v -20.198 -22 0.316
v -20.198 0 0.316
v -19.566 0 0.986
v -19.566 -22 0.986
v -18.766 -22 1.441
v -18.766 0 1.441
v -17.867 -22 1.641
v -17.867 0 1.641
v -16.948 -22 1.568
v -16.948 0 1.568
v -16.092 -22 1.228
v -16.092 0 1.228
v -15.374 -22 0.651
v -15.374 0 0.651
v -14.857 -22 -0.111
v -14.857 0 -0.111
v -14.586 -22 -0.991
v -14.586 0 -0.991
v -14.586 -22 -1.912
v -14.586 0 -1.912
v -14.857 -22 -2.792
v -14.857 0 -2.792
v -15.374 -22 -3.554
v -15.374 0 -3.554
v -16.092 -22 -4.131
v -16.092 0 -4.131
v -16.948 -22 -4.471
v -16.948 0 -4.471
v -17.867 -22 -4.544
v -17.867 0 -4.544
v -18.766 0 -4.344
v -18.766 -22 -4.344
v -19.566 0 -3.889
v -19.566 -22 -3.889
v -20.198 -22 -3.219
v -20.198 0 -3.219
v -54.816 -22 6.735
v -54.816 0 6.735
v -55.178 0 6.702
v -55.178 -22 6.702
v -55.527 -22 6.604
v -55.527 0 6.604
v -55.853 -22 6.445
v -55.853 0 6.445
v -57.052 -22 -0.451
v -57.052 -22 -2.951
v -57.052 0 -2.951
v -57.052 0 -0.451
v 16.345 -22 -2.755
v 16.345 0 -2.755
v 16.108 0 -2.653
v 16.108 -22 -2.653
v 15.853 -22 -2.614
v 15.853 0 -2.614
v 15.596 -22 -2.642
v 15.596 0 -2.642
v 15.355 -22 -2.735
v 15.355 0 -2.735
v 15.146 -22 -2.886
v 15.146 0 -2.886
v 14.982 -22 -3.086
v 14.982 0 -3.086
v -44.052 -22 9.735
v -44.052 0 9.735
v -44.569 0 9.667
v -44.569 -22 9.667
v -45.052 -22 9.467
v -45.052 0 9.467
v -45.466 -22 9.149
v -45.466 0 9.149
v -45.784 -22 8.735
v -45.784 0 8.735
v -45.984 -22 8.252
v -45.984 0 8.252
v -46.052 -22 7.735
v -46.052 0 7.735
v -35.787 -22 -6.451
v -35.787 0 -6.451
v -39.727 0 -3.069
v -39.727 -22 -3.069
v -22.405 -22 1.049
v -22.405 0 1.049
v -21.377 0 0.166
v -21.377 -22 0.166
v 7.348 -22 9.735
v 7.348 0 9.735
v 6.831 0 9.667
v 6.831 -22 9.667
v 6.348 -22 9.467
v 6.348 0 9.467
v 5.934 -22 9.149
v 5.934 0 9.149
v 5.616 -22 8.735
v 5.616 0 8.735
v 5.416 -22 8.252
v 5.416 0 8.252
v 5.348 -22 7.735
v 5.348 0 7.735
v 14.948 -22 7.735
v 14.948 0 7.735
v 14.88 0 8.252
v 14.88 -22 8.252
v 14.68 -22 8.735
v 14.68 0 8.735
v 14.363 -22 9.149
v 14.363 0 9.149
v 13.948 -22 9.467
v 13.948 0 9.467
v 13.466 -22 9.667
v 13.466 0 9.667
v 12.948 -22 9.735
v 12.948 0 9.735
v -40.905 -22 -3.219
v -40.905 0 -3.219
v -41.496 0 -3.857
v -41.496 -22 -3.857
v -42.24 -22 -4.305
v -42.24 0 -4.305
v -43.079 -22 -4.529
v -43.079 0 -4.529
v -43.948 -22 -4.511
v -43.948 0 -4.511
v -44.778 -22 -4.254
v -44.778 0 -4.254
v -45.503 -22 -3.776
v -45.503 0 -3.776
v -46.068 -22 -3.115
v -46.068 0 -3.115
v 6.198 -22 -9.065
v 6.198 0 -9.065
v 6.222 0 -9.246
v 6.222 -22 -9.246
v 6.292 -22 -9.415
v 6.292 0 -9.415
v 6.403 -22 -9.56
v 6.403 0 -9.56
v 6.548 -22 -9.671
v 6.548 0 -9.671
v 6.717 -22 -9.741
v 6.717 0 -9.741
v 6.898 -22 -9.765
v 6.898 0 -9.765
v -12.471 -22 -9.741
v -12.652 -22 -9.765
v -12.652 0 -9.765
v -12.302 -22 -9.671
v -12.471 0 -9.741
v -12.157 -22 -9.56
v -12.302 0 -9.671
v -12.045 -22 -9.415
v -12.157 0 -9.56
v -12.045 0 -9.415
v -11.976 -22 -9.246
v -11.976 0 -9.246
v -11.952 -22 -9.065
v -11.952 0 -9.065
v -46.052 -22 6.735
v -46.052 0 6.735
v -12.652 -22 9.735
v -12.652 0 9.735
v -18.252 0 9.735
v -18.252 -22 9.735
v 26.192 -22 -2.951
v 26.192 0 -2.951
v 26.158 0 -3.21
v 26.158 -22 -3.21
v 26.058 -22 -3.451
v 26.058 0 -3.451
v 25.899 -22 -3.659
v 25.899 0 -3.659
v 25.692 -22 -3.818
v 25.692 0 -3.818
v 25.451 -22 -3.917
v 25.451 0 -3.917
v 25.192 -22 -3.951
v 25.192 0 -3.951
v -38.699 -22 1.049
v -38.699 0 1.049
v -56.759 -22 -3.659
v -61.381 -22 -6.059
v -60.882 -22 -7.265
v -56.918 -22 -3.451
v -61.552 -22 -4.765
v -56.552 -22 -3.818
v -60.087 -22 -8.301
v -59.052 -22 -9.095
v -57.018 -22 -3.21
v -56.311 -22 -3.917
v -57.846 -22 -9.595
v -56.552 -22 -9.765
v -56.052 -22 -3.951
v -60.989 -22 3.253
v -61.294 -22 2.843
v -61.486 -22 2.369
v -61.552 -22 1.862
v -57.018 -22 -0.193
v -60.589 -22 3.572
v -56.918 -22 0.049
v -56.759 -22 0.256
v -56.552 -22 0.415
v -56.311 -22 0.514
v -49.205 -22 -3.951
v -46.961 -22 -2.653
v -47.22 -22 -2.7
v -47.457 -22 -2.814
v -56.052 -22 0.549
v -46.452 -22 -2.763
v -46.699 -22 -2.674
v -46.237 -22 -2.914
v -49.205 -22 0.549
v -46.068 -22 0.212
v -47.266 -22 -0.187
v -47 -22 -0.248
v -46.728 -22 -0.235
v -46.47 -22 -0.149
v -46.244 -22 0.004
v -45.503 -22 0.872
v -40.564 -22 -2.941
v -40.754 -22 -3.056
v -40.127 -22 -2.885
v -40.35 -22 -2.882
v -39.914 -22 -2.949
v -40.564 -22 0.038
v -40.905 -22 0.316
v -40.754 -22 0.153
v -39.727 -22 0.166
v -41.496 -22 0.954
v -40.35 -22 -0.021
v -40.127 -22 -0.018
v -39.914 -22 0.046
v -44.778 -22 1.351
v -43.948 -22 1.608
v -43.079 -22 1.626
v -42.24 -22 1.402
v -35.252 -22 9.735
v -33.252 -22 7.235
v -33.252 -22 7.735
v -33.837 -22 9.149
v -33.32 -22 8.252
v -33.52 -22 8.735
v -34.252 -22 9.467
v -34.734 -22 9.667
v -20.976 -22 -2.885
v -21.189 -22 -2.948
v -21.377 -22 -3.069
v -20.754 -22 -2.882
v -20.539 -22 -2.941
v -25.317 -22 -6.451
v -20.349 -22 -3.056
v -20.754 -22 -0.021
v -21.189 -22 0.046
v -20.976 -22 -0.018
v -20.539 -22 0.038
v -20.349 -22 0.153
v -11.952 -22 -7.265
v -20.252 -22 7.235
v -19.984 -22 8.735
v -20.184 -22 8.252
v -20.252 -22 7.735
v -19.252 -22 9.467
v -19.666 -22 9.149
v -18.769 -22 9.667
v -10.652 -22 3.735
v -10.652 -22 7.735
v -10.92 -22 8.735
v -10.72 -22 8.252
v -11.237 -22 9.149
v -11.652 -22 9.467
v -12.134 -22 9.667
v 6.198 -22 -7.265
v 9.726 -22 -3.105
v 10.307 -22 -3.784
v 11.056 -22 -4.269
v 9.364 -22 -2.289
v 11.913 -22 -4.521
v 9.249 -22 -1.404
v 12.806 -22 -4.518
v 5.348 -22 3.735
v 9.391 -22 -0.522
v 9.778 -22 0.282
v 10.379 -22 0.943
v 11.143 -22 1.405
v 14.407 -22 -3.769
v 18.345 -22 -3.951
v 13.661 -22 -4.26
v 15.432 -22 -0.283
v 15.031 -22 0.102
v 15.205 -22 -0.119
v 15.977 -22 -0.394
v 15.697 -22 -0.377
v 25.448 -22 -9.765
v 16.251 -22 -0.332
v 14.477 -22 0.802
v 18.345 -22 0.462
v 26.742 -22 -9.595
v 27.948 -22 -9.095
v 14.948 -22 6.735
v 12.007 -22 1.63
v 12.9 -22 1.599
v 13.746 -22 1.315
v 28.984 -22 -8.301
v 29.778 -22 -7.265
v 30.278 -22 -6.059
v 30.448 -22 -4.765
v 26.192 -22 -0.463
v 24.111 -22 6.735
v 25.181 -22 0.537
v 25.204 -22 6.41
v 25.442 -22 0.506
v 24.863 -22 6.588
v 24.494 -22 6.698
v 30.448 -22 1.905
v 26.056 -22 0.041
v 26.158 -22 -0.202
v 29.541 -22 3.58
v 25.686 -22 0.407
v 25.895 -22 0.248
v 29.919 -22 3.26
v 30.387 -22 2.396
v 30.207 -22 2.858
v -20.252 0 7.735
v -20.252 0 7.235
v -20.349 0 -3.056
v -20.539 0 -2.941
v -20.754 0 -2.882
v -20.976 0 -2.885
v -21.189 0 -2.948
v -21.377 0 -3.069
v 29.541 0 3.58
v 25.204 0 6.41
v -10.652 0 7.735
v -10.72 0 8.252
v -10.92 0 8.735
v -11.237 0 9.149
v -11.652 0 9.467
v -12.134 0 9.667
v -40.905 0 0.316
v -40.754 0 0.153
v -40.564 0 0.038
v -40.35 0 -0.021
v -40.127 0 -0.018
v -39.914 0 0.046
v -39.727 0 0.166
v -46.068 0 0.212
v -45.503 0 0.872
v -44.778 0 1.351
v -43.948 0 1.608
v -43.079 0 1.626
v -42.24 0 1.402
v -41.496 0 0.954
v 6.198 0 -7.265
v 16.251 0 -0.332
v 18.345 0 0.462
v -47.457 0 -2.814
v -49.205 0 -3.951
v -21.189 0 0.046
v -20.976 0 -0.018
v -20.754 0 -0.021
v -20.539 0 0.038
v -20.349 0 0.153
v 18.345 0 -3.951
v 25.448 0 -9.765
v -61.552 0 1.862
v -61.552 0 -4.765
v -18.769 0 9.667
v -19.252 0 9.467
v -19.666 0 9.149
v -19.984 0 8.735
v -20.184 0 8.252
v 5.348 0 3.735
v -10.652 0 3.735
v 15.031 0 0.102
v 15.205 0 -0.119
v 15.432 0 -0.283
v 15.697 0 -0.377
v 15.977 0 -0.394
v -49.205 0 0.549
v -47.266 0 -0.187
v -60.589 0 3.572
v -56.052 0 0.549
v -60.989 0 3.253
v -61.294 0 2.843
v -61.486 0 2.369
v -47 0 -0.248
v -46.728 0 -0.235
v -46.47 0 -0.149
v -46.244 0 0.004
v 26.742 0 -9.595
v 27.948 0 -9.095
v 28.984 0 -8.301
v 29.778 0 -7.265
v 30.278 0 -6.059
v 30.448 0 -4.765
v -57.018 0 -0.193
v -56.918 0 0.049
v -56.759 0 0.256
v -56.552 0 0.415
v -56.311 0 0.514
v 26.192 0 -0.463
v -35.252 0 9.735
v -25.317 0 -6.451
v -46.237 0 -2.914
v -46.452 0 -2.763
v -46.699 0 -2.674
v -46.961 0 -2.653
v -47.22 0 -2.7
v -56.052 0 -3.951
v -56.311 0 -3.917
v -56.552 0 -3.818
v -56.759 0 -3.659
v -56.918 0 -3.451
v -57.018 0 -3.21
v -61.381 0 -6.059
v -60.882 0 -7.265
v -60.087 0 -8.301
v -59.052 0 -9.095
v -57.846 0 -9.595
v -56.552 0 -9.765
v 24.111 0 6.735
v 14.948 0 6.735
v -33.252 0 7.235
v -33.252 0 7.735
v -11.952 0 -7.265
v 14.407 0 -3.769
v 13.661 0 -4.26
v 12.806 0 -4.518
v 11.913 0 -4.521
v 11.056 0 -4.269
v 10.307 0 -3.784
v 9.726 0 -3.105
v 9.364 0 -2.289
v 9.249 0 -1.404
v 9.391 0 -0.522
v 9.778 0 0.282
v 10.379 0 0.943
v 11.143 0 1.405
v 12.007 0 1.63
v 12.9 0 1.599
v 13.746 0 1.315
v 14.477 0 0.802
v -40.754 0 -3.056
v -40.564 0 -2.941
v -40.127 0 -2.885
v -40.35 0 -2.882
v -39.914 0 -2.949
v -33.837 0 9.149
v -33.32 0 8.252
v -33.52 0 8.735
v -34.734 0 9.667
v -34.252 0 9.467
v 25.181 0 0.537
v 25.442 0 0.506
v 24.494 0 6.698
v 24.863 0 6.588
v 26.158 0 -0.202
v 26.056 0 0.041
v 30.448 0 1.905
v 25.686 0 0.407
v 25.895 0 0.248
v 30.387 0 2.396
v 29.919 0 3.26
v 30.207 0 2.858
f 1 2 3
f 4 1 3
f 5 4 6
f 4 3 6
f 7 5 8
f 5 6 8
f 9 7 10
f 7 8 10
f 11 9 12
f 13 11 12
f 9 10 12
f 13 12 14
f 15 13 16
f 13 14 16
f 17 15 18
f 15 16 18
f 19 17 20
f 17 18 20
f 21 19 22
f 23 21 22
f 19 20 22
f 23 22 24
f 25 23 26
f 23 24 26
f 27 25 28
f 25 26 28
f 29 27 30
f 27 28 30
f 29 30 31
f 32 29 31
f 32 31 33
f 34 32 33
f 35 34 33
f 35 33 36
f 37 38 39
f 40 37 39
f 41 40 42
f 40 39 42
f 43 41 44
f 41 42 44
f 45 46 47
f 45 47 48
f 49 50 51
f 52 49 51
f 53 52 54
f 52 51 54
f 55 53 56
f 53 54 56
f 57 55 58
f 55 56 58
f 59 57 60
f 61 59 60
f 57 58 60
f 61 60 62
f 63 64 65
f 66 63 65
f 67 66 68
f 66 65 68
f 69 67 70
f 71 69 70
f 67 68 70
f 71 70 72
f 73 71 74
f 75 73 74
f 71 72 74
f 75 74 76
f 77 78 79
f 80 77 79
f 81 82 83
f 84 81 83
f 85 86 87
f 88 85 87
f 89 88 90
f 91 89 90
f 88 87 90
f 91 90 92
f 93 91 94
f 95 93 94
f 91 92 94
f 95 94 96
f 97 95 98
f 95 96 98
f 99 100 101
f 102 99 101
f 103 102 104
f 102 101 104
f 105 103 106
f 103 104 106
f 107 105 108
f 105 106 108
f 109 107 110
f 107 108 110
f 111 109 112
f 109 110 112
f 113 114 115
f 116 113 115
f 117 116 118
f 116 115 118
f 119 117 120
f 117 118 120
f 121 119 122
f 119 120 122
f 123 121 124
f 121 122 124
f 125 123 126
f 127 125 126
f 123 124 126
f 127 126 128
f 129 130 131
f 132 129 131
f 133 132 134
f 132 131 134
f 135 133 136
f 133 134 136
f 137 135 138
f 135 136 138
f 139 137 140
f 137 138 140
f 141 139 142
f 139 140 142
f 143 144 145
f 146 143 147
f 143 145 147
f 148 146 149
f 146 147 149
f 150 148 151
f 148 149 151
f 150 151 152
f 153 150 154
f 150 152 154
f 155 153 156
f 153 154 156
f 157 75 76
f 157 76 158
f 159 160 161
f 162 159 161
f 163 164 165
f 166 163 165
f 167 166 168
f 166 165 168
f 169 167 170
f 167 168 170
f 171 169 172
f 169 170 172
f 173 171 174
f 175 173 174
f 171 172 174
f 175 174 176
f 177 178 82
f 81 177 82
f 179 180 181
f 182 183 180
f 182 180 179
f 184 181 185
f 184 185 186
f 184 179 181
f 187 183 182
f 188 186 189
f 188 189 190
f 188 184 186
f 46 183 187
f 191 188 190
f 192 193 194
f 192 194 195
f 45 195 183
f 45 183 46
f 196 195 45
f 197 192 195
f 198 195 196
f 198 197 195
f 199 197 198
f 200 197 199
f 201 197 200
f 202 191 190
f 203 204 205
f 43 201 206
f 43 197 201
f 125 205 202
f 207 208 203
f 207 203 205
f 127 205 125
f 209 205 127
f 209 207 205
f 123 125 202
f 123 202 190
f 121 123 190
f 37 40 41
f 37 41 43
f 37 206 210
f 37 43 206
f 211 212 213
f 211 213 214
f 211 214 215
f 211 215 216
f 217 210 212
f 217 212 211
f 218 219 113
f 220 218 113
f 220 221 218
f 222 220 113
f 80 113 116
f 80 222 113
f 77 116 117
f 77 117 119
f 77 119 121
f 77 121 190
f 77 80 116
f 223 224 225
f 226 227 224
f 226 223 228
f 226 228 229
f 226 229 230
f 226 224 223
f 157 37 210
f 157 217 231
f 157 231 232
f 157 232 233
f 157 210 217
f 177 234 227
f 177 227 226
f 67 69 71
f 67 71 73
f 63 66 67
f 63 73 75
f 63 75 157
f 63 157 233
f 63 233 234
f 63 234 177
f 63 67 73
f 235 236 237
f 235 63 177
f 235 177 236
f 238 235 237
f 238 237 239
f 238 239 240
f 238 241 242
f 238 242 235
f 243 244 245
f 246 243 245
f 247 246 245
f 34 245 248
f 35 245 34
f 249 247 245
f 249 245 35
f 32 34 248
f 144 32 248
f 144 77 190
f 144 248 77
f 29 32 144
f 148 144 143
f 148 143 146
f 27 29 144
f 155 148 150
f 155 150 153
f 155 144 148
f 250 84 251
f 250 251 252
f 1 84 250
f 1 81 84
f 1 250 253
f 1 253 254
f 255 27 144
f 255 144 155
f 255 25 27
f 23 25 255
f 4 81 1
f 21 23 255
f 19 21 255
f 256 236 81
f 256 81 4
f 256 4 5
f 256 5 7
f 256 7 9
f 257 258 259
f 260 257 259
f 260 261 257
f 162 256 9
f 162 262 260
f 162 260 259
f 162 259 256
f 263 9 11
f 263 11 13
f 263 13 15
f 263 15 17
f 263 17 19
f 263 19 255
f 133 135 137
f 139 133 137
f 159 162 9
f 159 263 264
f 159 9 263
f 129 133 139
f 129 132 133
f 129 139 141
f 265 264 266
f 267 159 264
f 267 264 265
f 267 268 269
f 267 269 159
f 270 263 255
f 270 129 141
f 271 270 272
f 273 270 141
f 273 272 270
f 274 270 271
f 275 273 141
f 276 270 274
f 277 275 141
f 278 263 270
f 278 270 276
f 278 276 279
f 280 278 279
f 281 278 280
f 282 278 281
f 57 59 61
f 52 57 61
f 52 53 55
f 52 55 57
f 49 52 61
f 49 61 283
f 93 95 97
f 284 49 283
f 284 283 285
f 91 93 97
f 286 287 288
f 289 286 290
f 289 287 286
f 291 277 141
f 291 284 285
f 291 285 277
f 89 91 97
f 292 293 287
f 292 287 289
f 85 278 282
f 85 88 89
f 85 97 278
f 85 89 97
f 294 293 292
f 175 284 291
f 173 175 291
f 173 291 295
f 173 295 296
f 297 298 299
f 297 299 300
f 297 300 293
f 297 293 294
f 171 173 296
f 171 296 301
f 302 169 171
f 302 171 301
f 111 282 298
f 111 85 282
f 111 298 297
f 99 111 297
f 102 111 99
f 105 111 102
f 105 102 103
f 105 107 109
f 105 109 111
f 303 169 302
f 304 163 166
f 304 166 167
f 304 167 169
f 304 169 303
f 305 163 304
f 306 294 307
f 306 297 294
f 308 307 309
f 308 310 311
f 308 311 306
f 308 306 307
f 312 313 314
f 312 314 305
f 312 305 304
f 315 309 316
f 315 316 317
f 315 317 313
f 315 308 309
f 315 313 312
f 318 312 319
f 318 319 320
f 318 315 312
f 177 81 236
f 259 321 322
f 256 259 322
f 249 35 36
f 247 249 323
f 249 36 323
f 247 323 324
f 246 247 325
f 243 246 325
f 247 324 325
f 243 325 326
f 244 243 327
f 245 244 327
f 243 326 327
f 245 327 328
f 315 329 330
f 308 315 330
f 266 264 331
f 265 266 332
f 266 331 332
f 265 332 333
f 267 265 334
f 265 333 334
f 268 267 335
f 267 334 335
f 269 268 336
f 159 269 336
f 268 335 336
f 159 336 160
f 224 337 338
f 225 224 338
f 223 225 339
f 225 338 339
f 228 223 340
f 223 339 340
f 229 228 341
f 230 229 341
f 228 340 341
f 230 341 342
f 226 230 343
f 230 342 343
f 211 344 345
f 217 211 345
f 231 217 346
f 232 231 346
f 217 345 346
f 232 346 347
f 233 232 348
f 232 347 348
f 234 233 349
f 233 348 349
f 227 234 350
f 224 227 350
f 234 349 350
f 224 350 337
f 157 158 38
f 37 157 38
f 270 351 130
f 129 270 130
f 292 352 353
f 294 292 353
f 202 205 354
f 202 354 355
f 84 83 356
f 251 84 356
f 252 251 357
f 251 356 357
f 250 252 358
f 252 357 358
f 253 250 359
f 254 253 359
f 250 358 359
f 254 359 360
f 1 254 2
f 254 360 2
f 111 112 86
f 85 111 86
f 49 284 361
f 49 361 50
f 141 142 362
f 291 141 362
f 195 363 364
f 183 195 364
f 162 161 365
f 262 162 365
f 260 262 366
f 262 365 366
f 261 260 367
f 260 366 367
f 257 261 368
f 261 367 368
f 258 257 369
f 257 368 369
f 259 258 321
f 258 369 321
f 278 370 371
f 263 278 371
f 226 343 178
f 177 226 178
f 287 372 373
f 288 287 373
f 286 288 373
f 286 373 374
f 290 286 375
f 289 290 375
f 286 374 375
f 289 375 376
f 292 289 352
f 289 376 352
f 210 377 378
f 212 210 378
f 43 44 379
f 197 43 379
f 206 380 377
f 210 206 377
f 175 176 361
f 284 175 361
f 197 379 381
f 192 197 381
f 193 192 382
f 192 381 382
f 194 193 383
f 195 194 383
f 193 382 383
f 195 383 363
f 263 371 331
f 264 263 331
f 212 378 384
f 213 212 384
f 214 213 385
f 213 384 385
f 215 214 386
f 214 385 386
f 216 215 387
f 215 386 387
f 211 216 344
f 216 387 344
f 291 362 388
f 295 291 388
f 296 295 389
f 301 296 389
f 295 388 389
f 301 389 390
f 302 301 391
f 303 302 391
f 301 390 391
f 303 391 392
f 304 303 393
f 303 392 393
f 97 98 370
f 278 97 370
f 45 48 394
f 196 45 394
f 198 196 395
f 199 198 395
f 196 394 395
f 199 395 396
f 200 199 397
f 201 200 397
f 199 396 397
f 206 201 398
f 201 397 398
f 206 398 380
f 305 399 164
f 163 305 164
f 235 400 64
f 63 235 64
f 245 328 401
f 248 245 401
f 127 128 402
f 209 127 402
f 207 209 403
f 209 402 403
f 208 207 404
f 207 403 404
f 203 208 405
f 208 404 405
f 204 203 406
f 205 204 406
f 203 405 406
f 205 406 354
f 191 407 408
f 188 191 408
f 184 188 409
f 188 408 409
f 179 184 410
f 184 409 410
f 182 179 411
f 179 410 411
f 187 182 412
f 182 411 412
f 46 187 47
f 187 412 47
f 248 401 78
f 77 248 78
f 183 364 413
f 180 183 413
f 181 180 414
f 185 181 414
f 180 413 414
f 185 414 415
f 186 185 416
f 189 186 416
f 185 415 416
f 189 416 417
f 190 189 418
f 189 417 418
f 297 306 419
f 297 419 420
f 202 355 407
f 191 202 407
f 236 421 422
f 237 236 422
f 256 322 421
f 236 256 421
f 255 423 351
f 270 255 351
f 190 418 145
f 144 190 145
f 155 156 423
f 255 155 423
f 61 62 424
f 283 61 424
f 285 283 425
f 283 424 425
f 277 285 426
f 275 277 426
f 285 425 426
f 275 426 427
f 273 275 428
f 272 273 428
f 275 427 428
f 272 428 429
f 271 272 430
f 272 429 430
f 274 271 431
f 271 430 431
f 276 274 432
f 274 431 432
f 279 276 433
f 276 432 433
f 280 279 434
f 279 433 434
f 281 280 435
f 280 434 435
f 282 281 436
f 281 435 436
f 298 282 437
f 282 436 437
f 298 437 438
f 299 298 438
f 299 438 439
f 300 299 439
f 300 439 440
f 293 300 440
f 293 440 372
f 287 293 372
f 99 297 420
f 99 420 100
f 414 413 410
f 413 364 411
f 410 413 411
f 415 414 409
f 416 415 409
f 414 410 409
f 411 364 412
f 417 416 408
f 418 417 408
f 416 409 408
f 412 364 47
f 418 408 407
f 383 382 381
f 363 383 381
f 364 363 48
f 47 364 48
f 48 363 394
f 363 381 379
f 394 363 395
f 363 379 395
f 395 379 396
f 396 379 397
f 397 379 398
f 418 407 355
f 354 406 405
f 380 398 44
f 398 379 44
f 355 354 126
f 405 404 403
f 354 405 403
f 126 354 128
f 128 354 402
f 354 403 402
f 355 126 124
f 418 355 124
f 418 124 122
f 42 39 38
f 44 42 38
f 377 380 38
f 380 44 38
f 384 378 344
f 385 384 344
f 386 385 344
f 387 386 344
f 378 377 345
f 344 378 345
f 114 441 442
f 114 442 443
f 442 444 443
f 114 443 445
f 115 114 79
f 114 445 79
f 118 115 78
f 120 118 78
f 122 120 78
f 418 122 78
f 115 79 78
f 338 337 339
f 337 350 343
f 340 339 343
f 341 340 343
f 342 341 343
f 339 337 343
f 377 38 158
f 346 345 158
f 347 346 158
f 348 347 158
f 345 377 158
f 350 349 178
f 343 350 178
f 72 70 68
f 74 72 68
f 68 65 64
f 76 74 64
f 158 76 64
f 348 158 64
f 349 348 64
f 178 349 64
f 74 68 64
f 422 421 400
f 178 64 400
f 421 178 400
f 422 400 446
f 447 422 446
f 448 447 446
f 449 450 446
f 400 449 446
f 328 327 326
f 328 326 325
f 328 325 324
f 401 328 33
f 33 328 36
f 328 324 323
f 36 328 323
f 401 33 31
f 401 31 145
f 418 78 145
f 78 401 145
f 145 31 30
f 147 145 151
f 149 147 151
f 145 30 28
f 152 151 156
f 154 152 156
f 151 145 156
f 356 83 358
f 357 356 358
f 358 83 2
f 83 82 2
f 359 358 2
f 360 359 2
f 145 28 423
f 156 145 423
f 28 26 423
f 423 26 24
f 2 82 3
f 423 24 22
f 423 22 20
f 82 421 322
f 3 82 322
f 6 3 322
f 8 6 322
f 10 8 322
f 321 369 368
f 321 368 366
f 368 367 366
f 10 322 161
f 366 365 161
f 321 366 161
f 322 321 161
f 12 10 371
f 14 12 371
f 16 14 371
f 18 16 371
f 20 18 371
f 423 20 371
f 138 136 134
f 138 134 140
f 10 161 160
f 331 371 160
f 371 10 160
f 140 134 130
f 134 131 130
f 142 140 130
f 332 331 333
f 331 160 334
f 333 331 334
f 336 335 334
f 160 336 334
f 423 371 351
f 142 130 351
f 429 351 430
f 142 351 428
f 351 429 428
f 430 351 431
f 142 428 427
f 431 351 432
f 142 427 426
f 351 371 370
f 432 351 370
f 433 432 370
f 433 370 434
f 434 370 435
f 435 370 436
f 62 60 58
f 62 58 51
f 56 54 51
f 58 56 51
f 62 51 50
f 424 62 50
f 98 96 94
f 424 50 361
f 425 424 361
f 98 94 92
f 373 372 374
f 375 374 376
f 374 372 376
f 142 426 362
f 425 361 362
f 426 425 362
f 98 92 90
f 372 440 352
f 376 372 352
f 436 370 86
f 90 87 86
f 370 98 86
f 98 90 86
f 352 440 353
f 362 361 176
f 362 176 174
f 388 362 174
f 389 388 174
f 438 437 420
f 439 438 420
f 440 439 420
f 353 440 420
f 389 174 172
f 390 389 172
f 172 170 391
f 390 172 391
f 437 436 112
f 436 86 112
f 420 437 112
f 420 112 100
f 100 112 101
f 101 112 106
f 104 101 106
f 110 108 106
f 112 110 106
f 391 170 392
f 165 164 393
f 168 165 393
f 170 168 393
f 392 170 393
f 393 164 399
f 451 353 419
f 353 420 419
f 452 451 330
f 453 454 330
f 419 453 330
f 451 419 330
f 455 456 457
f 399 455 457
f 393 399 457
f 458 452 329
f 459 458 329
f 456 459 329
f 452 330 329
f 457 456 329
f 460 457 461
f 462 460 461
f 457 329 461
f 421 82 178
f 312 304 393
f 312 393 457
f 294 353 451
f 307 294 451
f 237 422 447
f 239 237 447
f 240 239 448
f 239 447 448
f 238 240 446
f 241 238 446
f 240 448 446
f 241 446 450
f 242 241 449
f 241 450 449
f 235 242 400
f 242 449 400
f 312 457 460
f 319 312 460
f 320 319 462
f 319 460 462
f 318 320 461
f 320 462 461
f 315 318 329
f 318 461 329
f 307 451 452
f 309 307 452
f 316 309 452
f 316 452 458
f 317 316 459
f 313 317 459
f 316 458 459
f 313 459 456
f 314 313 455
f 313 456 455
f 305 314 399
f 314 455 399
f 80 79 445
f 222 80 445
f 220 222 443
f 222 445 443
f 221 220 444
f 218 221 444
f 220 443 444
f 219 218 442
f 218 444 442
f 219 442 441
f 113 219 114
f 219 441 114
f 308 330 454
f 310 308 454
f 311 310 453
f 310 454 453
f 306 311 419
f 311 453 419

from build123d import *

# Parameters (mm, degrees)
F1_DEPTH = 22


with BuildPart() as f1:
    # F0 (on Front) → F1 (new body)
    with BuildSketch(Plane.XZ):
        with BuildLine():
            Line((-35.251705, 9.734763), (-44.051705, 9.734763))
            ThreePointArc((-44.051705, 9.734763), (-45.465918, 9.148977), (-46.051705, 7.734763))
            Line((-46.051705, 7.734763), (-46.051705, 6.734763))
            Line((-46.051705, 6.734763), (-54.816158, 6.734763))
            ThreePointArc((-54.816158, 6.734763), (-55.354677, 6.660898), (-55.853418, 6.444761))
            Line((-55.853418, 6.444761), (-60.588965, 3.572245))
            ThreePointArc((-60.588965, 3.572245), (-61.294479, 2.843441), (-61.551705, 1.862248))
            Line((-61.551705, 1.862248), (-61.551705, -4.765237))
            ThreePointArc((-61.551705, -4.765237), (-60.087239, -8.300771), (-56.551705, -9.765237))
            Line((-56.551705, -9.765237), (-12.651705, -9.765237))
            ThreePointArc((-12.651705, -9.765237), (-12.15673, -9.560212), (-11.951705, -9.065237))
            Line((-11.951705, -9.065237), (-11.951705, -7.265237))
            Line((-11.951705, -7.265237), (6.198295, -7.265237))
            Line((6.198295, -7.265237), (6.198295, -9.065237))
            ThreePointArc((6.198295, -9.065237), (6.40332, -9.560212), (6.898295, -9.765237))
            Line((6.898295, -9.765237), (25.448295, -9.765237))
            ThreePointArc((25.448295, -9.765237), (28.983829, -8.300771), (30.448295, -4.765237))
            Line((30.448295, -4.765237), (30.448295, 1.90505))
            ThreePointArc((30.448295, 1.90505), (30.206924, 2.857533), (29.541071, 3.580114))
            Line((29.541071, 3.580114), (25.203537, 6.409828))
            ThreePointArc((25.203537, 6.409828), (24.680792, 6.651809), (24.110761, 6.734763))
            Line((24.110761, 6.734763), (14.948295, 6.734763))
            Line((14.948295, 6.734763), (14.948295, 7.734763))
            ThreePointArc((14.948295, 7.734763), (14.362509, 9.148977), (12.948295, 9.734763))
            Line((12.948295, 9.734763), (7.348295, 9.734763))
            ThreePointArc((7.348295, 9.734763), (5.934082, 9.148977), (5.348295, 7.734763))
            Line((5.348295, 7.734763), (5.348295, 3.734763))
            Line((5.348295, 3.734763), (-10.651705, 3.734763))
            Line((-10.651705, 3.734763), (-10.651705, 7.734763))
            ThreePointArc((-10.651705, 7.734763), (-11.237491, 9.148977), (-12.651705, 9.734763))
            Line((-12.651705, 9.734763), (-18.251705, 9.734763))
            ThreePointArc((-18.251705, 9.734763), (-19.665918, 9.148977), (-20.251705, 7.734763))
            Line((-20.251705, 7.734763), (-20.251705, 7.234763))
            Line((-20.251705, 7.234763), (-33.251705, 7.234763))
            Line((-33.251705, 7.234763), (-33.251705, 7.734763))
            ThreePointArc((-33.251705, 7.734763), (-33.837491, 9.148977), (-35.251705, 9.734763))
        make_face()
        with BuildLine():
            ThreePointArc((-40.90523, -3.219393), (-43.514426, -4.55086), (-46.067619, -3.114923))
            ThreePointArc((-46.067619, -3.114923), (-46.699482, -2.674239), (-47.457145, -2.813521))
            Line((-47.457145, -2.813521), (-49.204705, -3.951495))
            Line((-49.204705, -3.951495), (-56.051705, -3.951495))
            ThreePointArc((-56.051705, -3.951495), (-56.758812, -3.658601), (-57.051705, -2.951495))
            Line((-57.051705, -2.951495), (-57.051705, -0.451495))
            ThreePointArc((-57.051705, -0.451495), (-56.758812, 0.255612), (-56.051705, 0.548505))
            Line((-56.051705, 0.548505), (-49.204805, 0.548505))
            Line((-49.204805, 0.548505), (-47.266027, -0.186586))
            ThreePointArc((-47.266027, -0.186586), (-46.595978, -0.200457), (-46.067649, 0.211886))
            ThreePointArc((-46.067649, 0.211886), (-43.514428, 1.647871), (-40.9052, 0.316361))
            ThreePointArc((-40.9052, 0.316361), (-40.349539, -0.020953), (-39.726865, 0.165639))
            Line((-39.726865, 0.165639), (-38.698705, 1.048505))
            Line((-38.698705, 1.048505), (-22.404805, 1.048505))
            Line((-22.404805, 1.048505), (-21.376582, 0.165586))
            ThreePointArc((-21.376582, 0.165586), (-20.753901, -0.021006), (-20.198239, 0.316318))
            ThreePointArc((-20.198239, 0.316318), (-14.551705, -1.451521), (-20.198269, -3.219265))
            ThreePointArc((-20.198269, -3.219265), (-20.753923, -2.881932), (-21.376606, -3.06851))
            Line((-21.376606, -3.06851), (-25.316505, -6.451495))
            Line((-25.316505, -6.451495), (-35.787205, -6.451495))
            Line((-35.787205, -6.451495), (-39.726916, -3.068671))
            ThreePointArc((-39.726916, -3.068671), (-40.349578, -2.88209), (-40.90523, -3.219393))
        make_face(mode=Mode.SUBTRACT)
        with BuildLine():
            ThreePointArc((14.982149, -3.08637), (9.248661, -1.403859), (15.031143, 0.101673))
            ThreePointArc((15.031143, 0.101673), (15.561388, -0.339456), (16.251102, -0.332352))
            Line((16.251102, -0.332352), (18.345387, 0.4617))
            Line((18.345387, 0.4617), (25.181225, 0.537321))
            ThreePointArc((25.181225, 0.537321), (25.895472, 0.248389), (26.192287, -0.462618))
            Line((26.192287, -0.462618), (26.192287, -2.951495))
            ThreePointArc((26.192287, -2.951495), (25.899394, -3.658601), (25.192287, -3.951495))
            Line((25.192287, -3.951495), (18.345387, -3.951495))
            Line((18.345387, -3.951495), (16.344939, -2.755456))
            ThreePointArc((16.344939, -2.755456), (15.595815, -2.641987), (14.982149, -3.08637))
        make_face(mode=Mode.SUBTRACT)
    extrude(amount=F1_DEPTH)


solid = f1.part
